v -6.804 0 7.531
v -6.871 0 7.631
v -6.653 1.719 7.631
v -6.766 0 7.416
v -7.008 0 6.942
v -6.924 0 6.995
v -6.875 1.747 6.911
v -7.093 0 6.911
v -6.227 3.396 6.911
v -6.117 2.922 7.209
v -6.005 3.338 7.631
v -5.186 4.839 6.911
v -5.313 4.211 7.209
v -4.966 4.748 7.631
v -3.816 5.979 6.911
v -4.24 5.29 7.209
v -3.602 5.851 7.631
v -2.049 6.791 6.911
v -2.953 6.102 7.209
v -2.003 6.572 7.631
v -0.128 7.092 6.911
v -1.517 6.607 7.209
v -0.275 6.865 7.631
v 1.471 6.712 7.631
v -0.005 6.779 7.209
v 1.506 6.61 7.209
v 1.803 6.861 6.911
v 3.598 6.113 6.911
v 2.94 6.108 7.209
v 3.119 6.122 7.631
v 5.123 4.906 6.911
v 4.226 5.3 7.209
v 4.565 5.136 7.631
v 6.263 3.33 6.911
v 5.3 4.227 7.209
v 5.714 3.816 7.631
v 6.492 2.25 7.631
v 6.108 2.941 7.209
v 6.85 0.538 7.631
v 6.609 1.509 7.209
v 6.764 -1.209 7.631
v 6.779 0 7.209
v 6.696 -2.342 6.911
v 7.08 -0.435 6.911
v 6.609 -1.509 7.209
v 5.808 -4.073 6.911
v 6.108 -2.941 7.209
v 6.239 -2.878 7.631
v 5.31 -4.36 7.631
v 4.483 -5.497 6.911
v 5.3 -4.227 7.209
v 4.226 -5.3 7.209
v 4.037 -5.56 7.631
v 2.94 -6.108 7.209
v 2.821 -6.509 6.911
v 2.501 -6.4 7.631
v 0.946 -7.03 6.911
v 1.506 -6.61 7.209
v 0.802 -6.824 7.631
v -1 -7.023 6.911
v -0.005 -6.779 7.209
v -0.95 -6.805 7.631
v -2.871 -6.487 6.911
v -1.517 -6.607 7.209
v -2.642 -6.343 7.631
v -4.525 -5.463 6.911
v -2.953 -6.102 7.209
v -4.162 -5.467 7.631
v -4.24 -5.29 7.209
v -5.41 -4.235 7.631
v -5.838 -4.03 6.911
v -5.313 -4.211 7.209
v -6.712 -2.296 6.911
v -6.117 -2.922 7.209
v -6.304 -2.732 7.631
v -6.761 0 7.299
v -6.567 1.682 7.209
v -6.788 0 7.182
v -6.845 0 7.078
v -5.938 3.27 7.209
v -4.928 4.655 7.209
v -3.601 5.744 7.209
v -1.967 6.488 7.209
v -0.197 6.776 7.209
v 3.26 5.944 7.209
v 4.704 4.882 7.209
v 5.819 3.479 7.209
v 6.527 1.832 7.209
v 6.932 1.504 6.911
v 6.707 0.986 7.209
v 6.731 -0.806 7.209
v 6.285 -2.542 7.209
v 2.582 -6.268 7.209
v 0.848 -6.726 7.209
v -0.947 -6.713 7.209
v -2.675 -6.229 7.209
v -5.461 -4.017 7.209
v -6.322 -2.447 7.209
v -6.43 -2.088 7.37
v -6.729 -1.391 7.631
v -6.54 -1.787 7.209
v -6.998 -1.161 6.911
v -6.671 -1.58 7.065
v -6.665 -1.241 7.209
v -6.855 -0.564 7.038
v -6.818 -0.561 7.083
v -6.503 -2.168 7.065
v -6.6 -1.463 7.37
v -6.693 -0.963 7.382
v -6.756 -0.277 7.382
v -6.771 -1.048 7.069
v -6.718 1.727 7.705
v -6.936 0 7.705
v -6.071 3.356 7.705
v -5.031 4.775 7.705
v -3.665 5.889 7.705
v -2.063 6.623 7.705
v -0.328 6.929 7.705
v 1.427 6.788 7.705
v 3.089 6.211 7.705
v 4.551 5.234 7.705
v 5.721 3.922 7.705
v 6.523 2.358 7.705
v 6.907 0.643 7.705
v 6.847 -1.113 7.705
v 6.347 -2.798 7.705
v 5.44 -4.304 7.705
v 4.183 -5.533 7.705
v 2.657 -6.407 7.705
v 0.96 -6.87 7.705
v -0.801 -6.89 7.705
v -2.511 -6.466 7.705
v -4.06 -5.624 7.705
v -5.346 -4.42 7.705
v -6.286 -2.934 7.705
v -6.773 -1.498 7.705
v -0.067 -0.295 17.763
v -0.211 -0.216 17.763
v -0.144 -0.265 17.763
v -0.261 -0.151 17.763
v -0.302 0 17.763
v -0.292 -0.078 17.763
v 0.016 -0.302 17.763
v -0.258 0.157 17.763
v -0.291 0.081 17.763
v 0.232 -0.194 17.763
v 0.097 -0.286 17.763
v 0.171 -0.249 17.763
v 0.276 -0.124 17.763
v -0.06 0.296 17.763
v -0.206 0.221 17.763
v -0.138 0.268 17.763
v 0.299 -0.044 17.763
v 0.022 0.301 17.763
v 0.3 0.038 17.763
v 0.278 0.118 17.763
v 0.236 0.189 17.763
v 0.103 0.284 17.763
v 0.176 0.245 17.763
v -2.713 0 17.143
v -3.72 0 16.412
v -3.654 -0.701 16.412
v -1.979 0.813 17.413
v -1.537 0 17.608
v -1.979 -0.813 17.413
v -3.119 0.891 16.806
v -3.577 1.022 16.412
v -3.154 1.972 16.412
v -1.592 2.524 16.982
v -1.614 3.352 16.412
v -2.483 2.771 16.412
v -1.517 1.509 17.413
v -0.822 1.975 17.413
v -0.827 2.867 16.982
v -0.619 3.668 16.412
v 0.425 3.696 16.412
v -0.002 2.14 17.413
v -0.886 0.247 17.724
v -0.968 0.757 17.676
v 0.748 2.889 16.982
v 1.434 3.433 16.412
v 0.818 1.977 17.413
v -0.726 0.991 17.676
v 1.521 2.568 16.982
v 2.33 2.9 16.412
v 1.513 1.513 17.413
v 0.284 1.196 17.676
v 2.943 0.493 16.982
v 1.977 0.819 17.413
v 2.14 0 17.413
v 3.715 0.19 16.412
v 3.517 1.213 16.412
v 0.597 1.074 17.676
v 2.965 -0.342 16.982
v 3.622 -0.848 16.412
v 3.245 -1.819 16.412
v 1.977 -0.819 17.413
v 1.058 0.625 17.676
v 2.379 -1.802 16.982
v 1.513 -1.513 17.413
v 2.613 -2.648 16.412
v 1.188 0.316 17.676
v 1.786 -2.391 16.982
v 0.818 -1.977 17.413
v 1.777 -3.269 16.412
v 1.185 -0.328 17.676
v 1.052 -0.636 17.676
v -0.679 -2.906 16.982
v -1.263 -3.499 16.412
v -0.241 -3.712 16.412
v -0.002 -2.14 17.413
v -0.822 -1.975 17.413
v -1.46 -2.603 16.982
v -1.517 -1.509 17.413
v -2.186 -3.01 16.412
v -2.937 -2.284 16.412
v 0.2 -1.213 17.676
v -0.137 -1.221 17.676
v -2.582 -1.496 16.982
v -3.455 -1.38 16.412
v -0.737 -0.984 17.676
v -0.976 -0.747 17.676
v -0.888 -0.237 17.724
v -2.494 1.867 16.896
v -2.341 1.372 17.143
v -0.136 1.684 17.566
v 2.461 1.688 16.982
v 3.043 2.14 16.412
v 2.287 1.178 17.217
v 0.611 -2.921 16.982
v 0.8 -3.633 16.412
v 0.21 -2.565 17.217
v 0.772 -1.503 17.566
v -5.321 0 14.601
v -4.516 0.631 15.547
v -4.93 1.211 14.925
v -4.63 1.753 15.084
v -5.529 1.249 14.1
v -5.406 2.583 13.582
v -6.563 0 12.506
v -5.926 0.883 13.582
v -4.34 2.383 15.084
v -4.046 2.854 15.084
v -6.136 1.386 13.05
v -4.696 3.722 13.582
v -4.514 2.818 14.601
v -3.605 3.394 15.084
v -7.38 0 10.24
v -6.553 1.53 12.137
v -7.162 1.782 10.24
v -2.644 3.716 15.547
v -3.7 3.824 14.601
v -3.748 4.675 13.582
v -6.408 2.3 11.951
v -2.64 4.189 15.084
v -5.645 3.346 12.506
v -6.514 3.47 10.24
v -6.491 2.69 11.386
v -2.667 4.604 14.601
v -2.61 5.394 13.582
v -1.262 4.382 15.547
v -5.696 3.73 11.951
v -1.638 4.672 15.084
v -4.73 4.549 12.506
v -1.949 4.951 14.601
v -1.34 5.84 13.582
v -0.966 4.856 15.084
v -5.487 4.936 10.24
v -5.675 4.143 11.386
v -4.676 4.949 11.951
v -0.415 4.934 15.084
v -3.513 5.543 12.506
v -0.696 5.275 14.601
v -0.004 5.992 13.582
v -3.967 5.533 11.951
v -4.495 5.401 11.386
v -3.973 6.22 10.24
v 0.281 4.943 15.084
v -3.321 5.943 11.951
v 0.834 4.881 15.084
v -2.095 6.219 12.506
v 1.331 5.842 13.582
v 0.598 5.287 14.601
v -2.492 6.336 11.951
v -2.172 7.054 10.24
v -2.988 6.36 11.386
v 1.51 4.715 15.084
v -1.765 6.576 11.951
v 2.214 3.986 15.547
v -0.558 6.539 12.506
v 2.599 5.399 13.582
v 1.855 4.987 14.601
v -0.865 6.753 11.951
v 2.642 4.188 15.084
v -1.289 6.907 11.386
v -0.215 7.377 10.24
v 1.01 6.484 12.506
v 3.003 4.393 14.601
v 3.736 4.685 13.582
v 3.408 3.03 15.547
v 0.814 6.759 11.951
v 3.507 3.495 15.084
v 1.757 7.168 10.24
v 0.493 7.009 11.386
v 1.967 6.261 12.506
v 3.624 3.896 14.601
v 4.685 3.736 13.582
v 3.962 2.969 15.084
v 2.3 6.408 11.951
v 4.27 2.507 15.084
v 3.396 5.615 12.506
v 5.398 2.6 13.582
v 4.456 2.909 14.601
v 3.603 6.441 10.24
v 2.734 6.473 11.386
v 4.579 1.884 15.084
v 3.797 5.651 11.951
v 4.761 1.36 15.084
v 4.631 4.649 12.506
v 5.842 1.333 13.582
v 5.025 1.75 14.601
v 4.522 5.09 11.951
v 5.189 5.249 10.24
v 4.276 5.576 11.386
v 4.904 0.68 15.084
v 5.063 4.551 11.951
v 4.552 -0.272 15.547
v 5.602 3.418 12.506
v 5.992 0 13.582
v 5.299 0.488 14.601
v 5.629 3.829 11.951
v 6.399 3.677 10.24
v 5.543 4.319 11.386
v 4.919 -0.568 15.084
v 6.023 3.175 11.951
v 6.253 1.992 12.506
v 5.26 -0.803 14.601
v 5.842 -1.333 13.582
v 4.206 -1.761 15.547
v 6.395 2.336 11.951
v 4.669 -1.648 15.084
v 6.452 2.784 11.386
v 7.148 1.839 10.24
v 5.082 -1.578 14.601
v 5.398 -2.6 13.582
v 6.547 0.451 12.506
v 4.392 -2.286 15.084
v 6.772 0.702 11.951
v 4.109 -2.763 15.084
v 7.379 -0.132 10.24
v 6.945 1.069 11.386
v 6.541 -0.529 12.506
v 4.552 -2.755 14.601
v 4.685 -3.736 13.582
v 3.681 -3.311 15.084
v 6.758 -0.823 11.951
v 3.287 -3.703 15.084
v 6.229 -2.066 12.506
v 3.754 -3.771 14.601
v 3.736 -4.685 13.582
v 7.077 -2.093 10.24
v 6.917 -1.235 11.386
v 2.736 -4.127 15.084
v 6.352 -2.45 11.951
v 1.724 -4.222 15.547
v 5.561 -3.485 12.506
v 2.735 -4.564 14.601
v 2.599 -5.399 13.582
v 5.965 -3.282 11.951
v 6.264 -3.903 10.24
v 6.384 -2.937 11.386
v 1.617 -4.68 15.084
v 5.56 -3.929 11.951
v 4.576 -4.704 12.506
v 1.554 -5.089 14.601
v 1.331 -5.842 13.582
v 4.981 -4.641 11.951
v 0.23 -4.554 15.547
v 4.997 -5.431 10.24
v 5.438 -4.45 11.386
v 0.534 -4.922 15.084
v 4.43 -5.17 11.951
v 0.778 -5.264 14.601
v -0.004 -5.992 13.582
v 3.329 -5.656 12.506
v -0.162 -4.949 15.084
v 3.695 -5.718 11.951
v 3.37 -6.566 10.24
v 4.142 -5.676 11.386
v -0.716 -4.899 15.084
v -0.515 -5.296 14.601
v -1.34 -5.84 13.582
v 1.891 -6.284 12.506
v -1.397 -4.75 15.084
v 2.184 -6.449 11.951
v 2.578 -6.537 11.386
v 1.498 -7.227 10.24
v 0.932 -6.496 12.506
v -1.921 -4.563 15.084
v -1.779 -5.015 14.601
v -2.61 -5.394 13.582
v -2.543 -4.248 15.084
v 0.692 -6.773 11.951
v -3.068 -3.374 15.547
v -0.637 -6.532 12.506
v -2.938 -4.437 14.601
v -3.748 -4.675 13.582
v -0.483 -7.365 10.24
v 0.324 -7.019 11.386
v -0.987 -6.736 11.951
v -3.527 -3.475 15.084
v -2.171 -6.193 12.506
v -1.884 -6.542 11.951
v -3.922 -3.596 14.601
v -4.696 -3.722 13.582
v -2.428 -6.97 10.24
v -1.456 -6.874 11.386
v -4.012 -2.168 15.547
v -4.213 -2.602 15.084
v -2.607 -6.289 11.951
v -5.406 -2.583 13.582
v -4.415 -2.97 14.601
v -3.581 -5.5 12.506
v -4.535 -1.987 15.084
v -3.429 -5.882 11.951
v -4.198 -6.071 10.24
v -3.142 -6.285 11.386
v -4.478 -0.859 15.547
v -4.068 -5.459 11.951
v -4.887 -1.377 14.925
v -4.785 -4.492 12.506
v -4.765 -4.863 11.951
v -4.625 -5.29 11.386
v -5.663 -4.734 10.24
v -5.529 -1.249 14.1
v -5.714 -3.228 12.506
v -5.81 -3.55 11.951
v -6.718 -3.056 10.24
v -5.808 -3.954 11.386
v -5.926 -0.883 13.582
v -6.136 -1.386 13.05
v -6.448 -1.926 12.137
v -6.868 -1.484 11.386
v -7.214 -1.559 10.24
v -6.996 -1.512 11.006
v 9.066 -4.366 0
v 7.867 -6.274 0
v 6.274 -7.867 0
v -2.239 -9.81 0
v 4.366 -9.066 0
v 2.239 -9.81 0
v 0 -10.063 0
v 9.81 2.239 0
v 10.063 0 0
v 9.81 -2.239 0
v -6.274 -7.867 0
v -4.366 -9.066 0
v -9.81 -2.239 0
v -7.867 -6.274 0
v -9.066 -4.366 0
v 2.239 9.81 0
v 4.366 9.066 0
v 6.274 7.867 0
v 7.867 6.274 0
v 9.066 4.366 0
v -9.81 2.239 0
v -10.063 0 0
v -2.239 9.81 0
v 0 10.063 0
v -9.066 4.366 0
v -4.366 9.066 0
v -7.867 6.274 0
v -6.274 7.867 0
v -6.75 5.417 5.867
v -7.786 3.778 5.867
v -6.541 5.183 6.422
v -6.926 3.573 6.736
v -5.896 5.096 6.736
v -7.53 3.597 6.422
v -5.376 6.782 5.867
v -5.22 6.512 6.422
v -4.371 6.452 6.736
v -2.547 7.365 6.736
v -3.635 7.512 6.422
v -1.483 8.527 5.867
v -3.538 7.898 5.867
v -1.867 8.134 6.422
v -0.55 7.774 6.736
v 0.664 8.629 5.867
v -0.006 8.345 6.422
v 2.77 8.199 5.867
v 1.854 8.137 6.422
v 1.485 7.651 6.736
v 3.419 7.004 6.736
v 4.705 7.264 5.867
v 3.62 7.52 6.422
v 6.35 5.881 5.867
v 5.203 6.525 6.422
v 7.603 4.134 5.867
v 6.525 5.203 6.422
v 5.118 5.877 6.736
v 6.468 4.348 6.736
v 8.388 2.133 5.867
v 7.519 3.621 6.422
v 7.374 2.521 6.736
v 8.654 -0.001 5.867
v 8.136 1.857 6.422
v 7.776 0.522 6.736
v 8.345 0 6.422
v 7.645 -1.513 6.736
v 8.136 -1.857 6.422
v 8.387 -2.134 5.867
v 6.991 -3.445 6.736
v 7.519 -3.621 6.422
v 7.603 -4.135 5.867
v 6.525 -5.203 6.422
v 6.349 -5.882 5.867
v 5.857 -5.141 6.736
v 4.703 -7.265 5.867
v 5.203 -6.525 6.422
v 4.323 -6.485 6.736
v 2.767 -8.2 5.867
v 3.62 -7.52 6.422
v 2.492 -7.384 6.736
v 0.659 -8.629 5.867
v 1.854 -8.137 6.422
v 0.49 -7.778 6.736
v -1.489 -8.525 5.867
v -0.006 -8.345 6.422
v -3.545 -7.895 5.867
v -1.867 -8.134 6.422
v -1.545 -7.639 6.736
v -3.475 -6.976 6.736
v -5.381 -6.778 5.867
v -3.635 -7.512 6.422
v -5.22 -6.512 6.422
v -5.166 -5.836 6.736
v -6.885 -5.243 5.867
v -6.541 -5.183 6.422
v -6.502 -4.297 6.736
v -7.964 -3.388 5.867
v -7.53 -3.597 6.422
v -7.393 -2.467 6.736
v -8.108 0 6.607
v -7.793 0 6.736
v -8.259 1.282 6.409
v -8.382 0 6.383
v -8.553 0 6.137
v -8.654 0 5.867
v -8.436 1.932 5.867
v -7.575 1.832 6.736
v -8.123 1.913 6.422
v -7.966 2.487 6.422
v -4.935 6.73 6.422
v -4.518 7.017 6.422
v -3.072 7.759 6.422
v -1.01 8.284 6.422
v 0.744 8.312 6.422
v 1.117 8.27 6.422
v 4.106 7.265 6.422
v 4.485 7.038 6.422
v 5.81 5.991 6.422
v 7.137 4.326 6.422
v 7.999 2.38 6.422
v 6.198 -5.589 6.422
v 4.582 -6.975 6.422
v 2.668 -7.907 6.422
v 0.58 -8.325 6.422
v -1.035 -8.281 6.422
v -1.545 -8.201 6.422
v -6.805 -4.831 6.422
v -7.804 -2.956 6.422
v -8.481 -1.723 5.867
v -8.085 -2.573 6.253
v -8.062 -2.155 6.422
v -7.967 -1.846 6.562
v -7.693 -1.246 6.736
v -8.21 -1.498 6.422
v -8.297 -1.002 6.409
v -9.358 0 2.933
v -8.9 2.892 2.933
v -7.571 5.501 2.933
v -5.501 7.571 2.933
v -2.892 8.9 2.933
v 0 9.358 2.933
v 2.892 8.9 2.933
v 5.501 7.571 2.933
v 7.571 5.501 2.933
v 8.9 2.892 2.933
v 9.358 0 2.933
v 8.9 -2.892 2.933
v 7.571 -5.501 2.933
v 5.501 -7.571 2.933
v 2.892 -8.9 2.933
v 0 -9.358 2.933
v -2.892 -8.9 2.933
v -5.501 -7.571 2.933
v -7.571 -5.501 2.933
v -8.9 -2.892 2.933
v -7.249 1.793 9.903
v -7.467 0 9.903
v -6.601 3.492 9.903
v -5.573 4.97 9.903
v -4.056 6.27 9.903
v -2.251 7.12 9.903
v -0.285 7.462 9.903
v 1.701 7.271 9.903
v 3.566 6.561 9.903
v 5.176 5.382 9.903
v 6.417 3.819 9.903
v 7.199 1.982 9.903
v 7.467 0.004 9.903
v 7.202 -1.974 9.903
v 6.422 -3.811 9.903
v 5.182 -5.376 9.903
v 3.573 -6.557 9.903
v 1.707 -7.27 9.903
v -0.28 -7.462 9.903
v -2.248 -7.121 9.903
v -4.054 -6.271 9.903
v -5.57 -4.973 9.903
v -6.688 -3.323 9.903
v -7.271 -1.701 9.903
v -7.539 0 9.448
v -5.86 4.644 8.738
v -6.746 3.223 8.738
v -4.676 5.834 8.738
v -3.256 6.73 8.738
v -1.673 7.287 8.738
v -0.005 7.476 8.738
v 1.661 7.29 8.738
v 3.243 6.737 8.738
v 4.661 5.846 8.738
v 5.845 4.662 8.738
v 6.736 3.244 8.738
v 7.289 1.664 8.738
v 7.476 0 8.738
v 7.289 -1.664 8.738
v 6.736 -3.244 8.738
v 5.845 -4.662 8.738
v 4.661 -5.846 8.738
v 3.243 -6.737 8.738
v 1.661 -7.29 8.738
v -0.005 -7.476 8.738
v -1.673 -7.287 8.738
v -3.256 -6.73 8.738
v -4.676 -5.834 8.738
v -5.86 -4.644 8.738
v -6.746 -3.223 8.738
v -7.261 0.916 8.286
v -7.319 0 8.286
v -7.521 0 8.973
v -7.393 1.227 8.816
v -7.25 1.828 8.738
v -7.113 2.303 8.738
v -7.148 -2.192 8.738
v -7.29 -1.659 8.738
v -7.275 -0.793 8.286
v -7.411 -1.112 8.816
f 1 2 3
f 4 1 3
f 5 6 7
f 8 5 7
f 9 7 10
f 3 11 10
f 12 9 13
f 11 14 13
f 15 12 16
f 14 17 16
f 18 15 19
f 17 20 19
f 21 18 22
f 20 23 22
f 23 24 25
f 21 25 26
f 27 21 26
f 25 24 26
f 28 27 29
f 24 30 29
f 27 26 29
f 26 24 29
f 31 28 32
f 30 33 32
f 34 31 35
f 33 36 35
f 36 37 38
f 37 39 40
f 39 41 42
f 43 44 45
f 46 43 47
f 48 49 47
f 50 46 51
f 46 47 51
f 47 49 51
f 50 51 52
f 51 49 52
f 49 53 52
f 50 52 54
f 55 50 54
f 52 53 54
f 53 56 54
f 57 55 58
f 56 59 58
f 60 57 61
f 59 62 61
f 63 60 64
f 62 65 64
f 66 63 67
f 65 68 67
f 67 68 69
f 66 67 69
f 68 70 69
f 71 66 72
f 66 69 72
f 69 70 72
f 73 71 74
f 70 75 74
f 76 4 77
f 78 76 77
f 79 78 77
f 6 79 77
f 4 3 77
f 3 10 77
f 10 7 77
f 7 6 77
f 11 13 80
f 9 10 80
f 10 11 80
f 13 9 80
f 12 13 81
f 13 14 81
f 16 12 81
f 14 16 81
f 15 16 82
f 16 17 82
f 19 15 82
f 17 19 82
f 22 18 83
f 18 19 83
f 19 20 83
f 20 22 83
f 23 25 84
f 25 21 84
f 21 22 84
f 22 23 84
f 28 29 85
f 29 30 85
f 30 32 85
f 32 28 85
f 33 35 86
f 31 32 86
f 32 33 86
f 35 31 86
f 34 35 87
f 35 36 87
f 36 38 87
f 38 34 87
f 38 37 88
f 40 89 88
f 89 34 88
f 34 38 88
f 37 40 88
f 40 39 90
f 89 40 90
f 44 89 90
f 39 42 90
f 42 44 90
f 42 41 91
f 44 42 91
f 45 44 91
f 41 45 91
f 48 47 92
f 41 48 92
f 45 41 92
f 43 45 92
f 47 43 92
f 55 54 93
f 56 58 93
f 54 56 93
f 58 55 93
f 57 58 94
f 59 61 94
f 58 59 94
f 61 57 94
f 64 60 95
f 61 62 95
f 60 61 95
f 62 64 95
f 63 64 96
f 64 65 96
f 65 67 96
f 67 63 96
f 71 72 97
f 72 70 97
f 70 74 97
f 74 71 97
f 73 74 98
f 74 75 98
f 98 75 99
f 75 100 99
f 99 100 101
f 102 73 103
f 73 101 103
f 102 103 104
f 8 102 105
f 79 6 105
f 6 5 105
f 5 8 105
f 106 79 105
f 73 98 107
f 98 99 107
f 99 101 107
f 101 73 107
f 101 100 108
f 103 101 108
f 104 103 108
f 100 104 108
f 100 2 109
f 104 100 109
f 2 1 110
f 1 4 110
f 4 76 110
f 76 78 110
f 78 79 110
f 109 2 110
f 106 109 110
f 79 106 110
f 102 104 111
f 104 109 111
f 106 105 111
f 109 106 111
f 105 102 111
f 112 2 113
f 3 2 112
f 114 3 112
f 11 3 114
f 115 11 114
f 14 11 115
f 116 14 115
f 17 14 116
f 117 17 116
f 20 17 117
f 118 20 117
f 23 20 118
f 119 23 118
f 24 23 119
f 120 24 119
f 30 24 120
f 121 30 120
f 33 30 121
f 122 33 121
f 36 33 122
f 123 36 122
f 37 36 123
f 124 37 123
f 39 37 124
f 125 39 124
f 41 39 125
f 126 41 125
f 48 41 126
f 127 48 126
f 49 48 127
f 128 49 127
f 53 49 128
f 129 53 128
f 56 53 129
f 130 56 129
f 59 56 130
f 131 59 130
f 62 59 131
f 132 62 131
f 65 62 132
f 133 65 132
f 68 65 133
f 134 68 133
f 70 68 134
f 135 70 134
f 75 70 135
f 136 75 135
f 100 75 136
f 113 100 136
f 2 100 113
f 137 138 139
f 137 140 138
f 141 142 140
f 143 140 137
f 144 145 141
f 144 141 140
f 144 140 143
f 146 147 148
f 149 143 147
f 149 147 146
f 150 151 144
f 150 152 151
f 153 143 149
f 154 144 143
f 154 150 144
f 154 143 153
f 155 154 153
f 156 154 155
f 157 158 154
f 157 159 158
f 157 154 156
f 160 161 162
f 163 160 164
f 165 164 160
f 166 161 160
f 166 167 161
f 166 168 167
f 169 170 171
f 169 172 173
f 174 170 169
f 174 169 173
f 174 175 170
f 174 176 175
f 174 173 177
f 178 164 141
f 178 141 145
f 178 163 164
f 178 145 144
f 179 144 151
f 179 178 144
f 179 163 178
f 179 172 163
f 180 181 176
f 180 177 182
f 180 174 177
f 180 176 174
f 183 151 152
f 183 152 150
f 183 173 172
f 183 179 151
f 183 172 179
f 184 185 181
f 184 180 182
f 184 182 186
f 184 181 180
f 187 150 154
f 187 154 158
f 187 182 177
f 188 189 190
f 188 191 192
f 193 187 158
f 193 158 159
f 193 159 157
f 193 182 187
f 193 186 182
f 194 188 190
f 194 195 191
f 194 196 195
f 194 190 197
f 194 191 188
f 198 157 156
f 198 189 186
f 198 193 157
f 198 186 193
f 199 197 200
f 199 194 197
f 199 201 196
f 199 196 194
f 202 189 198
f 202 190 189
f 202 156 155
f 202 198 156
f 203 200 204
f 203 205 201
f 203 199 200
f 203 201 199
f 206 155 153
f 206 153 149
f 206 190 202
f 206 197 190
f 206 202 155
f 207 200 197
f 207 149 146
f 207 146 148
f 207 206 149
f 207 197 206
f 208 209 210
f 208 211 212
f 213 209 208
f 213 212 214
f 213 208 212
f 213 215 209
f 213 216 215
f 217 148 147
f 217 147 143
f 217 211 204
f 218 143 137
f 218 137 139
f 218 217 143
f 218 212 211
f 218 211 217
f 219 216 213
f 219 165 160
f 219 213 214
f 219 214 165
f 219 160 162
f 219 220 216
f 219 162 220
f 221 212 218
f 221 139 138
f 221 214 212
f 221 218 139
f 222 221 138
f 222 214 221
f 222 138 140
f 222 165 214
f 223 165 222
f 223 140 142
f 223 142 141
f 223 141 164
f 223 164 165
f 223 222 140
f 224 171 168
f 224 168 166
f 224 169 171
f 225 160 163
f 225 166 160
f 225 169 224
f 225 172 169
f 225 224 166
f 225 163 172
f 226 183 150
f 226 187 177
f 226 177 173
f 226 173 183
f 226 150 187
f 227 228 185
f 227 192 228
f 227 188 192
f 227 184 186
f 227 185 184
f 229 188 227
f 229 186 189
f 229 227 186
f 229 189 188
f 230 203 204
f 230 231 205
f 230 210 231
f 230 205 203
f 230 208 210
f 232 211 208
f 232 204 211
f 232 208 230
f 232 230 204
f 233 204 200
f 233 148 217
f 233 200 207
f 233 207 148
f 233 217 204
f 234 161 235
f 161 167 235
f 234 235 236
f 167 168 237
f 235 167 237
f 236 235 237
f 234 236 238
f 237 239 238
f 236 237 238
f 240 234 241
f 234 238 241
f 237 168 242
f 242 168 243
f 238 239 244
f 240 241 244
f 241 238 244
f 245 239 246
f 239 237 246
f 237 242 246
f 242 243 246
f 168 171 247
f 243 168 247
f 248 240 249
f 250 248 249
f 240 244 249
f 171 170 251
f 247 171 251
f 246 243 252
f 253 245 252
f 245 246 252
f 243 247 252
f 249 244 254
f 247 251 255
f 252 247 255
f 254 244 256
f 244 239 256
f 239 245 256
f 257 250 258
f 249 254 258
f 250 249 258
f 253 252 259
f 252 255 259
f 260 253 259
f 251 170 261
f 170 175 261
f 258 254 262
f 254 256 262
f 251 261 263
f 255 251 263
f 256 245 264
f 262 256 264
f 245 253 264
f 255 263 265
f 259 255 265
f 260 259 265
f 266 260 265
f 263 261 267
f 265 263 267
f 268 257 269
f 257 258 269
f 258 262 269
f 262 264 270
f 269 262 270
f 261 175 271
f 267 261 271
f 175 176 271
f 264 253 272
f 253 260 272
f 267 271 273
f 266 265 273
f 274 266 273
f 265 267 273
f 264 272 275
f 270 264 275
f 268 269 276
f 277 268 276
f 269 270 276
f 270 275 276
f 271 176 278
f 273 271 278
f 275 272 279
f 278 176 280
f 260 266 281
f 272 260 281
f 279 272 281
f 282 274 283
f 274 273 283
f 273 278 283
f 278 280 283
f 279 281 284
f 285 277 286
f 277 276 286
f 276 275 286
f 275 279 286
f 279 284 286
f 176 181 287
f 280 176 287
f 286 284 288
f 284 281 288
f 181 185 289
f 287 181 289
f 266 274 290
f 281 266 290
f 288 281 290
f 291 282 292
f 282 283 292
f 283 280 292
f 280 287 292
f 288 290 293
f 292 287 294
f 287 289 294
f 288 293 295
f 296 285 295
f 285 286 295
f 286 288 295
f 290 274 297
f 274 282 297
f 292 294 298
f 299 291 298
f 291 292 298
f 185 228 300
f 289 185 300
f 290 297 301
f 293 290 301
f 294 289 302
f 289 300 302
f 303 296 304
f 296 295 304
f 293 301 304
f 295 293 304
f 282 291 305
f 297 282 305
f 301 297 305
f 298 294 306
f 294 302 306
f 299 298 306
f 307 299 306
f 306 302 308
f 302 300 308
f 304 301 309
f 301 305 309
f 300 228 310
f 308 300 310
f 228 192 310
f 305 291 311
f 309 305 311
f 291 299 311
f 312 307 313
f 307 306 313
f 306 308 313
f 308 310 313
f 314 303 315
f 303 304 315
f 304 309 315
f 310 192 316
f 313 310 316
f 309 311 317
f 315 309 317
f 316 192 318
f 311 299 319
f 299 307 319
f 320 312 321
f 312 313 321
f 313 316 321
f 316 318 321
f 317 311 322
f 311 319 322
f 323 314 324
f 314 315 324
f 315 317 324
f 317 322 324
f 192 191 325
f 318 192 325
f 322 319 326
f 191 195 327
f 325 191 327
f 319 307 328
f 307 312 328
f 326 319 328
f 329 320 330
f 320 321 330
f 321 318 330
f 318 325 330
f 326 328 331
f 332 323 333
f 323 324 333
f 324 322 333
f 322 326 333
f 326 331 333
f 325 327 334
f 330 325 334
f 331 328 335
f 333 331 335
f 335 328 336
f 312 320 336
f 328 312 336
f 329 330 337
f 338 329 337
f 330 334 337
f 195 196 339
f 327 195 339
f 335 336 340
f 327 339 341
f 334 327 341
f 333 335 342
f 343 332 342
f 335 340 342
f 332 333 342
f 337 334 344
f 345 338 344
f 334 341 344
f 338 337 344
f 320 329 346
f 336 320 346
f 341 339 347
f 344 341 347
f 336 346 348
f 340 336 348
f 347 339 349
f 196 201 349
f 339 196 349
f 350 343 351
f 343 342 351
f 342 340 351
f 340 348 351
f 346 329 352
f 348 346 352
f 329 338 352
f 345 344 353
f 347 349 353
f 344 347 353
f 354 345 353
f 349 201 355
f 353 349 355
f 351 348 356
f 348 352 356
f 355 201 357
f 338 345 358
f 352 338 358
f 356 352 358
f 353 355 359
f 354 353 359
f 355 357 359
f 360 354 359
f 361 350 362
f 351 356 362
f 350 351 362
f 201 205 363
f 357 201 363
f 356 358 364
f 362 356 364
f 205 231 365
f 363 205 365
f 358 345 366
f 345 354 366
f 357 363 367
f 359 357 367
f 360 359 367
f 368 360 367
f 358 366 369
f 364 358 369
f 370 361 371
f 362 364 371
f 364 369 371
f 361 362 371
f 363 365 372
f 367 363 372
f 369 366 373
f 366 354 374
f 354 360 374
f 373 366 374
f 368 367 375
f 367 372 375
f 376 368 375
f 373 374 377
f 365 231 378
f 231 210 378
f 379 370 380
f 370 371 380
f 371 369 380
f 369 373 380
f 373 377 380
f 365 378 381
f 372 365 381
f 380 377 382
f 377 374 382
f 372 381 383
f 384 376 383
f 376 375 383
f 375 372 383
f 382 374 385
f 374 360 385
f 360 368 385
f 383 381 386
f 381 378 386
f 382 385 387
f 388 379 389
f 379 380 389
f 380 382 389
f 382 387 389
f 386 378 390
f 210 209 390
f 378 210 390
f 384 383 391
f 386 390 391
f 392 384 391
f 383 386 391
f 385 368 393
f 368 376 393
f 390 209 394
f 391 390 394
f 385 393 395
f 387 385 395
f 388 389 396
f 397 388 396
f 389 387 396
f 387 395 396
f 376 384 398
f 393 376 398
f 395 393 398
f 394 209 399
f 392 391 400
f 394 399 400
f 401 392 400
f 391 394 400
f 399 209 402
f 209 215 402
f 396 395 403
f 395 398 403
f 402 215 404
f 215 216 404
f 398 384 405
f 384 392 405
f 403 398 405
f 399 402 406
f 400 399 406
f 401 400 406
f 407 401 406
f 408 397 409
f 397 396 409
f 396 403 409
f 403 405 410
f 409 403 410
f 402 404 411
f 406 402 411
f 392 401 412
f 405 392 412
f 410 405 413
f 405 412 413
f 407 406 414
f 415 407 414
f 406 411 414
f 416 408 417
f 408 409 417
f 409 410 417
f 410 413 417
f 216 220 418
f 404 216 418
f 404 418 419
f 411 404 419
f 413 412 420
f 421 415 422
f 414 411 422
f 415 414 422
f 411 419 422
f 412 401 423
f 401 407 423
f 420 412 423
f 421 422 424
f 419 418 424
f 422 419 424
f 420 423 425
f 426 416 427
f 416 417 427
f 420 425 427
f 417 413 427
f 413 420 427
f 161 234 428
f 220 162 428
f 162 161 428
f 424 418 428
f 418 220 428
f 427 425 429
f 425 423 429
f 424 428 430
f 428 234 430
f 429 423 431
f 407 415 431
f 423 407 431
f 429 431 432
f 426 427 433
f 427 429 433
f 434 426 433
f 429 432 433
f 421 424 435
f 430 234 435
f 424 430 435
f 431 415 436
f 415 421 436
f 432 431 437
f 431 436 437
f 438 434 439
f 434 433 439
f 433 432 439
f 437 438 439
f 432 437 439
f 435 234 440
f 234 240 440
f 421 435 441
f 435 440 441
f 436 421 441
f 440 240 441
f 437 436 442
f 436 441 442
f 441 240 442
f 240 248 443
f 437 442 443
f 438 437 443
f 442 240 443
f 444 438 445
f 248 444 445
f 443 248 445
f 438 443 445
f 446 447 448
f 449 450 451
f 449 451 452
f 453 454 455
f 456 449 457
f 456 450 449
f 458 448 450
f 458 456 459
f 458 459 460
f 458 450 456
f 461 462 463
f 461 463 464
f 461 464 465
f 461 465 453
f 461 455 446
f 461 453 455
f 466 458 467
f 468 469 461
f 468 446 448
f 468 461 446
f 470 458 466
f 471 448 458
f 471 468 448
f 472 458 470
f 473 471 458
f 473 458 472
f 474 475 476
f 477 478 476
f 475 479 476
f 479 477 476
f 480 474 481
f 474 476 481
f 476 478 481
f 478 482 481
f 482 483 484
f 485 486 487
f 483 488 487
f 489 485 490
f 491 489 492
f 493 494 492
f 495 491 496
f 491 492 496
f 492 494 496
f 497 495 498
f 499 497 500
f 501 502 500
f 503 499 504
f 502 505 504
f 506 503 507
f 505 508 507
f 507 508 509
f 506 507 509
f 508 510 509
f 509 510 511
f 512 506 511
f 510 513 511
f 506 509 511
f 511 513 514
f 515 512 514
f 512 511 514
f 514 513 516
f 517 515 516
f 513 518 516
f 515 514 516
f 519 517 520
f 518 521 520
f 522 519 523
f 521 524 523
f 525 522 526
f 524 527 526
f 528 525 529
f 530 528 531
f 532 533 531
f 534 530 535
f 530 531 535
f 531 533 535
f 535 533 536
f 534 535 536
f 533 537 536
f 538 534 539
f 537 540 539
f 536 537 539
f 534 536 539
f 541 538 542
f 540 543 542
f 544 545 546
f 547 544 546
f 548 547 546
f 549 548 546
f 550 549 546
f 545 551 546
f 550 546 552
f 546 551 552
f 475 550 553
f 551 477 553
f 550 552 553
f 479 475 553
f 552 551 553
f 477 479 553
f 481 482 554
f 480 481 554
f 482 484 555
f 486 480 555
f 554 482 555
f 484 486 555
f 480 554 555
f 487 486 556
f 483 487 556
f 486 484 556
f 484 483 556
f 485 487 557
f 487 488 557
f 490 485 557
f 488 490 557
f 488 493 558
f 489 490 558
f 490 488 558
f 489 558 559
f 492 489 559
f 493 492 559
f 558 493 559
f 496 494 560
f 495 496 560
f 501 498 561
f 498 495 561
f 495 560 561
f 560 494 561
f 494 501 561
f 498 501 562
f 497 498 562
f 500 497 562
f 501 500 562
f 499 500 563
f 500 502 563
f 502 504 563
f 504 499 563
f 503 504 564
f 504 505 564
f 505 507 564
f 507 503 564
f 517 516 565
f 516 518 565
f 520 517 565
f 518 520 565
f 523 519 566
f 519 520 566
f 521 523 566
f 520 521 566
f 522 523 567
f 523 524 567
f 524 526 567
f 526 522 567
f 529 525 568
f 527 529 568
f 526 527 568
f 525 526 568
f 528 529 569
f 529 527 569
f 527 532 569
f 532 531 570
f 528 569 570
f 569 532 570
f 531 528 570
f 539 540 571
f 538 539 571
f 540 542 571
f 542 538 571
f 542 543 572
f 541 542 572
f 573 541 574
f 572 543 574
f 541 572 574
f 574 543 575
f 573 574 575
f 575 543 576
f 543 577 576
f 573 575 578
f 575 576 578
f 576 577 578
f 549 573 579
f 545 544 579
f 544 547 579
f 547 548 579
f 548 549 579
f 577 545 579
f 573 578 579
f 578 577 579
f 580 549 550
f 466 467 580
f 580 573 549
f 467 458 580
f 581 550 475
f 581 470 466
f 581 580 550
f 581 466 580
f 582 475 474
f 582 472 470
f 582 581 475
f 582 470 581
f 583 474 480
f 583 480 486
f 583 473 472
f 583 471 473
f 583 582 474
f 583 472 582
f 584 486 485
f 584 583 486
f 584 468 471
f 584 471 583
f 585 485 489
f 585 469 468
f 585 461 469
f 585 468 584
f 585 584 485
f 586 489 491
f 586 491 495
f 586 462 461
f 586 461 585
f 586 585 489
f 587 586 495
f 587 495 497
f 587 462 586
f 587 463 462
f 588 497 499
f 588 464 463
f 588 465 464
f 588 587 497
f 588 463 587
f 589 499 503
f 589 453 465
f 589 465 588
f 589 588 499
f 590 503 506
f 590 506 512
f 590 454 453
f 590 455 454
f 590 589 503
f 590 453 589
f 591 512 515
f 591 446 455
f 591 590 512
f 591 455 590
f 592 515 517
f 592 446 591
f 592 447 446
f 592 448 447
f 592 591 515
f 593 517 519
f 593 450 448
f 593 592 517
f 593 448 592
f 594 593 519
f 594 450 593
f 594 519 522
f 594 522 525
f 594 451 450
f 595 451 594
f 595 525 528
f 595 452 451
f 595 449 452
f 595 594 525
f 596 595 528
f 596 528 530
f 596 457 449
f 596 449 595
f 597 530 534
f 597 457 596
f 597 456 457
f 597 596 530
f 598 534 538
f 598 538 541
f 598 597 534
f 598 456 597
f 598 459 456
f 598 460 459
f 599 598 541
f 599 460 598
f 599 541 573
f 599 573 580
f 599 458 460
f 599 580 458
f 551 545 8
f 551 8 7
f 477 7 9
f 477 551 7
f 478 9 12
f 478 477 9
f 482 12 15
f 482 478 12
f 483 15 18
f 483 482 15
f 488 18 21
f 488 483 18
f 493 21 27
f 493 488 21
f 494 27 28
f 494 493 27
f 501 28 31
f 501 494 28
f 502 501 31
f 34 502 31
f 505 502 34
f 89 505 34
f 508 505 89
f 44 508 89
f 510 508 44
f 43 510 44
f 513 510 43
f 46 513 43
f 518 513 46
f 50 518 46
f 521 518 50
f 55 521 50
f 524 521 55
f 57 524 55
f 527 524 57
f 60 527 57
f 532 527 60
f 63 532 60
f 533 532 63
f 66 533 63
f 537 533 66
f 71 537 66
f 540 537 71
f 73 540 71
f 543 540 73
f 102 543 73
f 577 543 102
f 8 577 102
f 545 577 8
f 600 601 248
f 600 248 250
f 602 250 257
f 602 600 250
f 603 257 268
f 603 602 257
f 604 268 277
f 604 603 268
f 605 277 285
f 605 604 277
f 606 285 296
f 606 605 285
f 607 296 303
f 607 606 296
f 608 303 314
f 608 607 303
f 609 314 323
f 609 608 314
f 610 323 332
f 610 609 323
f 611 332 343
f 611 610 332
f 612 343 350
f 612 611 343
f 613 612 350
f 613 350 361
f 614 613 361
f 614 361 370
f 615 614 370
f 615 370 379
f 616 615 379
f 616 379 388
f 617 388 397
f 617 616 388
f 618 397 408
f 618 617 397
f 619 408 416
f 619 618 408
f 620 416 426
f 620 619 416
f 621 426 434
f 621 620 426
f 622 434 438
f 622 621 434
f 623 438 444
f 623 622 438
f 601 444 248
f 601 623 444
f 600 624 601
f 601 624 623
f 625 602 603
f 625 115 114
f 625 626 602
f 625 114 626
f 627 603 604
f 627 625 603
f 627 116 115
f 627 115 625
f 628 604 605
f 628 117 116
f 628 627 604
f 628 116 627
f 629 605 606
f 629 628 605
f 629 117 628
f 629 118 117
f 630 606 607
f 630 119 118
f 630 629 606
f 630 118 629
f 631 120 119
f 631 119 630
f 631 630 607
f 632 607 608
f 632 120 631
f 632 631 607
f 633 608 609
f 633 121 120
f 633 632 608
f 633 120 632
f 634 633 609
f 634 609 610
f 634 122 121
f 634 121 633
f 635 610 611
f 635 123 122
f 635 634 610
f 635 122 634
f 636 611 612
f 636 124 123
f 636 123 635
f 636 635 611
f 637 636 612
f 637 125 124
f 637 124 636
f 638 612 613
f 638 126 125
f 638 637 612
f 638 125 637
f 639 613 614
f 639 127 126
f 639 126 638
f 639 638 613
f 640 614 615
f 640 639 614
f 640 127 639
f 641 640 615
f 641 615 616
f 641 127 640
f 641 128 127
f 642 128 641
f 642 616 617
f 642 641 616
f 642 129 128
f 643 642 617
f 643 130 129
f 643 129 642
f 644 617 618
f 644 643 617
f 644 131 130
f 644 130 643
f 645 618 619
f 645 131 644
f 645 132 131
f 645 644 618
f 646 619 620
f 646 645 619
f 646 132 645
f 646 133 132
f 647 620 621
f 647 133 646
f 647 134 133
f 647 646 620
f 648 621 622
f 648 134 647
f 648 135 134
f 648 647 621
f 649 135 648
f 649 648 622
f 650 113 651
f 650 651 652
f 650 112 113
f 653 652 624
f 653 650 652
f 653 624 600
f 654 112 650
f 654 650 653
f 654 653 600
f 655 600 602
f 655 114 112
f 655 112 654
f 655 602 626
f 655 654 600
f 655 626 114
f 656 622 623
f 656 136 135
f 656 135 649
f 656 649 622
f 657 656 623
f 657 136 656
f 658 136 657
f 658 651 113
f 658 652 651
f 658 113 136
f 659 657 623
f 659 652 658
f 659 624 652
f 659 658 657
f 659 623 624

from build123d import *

# Parameters (mm, degrees)
F2_R = 12.85994464
F3_R = 1.1798499289
F4_R = 2.4039125508
F5_R = 0.4407061183
F6_R = 5


with BuildPart() as f1:
    # F0 (on Front) → F1 (revolve)
    with BuildSketch(Plane.XZ):
        Polygon((-10.0625008345, 0), (0, 0), (0, 17.7625007927), (-2.1874997765, 17.7625007927), (-6.3875010237, 14.0875000507), (-7.7875000425, 8.6625004187), (-6.3875010237, 7.0875007659), (-8.4875002503, 6.5625002608), align=None)
    revolve(axis=Axis((0, 0, 8.8812503964), (0, 0, -1)))

    # F2
    f2_edges = [f1.edges().sort_by_distance(p)[0] for p in [
        (6.387501, 0, 14.0875),
    ]]
    fillet(f2_edges, radius=F2_R)

    # F3
    f3_edges = [f1.edges().sort_by_distance(p)[0] for p in [
        (8.4875, 0, 6.5625),
    ]]
    fillet(f3_edges, radius=F3_R)

    # F4
    f4_edges = [f1.edges().sort_by_distance(p)[0] for p in [
        (7.7875, 0, 8.6625),
    ]]
    fillet(f4_edges, radius=F4_R)

    # F5
    f5_edges = [f1.edges().sort_by_distance(p)[0] for p in [
        (-6.661983, 0, 7.396293),
        (6.936463, 0, 7.705085),
        (6.387501, 0, 7.087501),
    ]]
    fillet(f5_edges, radius=F5_R)

    # F6
    f6_edges = [f1.edges().sort_by_distance(p)[0] for p in [
        (-2.792166, 0, 17.233418),
        (3.396831, 0, 16.704336),
        (2.1875, 0, 17.762501),
    ]]
    fillet(f6_edges, radius=F6_R)


solid = f1.part
